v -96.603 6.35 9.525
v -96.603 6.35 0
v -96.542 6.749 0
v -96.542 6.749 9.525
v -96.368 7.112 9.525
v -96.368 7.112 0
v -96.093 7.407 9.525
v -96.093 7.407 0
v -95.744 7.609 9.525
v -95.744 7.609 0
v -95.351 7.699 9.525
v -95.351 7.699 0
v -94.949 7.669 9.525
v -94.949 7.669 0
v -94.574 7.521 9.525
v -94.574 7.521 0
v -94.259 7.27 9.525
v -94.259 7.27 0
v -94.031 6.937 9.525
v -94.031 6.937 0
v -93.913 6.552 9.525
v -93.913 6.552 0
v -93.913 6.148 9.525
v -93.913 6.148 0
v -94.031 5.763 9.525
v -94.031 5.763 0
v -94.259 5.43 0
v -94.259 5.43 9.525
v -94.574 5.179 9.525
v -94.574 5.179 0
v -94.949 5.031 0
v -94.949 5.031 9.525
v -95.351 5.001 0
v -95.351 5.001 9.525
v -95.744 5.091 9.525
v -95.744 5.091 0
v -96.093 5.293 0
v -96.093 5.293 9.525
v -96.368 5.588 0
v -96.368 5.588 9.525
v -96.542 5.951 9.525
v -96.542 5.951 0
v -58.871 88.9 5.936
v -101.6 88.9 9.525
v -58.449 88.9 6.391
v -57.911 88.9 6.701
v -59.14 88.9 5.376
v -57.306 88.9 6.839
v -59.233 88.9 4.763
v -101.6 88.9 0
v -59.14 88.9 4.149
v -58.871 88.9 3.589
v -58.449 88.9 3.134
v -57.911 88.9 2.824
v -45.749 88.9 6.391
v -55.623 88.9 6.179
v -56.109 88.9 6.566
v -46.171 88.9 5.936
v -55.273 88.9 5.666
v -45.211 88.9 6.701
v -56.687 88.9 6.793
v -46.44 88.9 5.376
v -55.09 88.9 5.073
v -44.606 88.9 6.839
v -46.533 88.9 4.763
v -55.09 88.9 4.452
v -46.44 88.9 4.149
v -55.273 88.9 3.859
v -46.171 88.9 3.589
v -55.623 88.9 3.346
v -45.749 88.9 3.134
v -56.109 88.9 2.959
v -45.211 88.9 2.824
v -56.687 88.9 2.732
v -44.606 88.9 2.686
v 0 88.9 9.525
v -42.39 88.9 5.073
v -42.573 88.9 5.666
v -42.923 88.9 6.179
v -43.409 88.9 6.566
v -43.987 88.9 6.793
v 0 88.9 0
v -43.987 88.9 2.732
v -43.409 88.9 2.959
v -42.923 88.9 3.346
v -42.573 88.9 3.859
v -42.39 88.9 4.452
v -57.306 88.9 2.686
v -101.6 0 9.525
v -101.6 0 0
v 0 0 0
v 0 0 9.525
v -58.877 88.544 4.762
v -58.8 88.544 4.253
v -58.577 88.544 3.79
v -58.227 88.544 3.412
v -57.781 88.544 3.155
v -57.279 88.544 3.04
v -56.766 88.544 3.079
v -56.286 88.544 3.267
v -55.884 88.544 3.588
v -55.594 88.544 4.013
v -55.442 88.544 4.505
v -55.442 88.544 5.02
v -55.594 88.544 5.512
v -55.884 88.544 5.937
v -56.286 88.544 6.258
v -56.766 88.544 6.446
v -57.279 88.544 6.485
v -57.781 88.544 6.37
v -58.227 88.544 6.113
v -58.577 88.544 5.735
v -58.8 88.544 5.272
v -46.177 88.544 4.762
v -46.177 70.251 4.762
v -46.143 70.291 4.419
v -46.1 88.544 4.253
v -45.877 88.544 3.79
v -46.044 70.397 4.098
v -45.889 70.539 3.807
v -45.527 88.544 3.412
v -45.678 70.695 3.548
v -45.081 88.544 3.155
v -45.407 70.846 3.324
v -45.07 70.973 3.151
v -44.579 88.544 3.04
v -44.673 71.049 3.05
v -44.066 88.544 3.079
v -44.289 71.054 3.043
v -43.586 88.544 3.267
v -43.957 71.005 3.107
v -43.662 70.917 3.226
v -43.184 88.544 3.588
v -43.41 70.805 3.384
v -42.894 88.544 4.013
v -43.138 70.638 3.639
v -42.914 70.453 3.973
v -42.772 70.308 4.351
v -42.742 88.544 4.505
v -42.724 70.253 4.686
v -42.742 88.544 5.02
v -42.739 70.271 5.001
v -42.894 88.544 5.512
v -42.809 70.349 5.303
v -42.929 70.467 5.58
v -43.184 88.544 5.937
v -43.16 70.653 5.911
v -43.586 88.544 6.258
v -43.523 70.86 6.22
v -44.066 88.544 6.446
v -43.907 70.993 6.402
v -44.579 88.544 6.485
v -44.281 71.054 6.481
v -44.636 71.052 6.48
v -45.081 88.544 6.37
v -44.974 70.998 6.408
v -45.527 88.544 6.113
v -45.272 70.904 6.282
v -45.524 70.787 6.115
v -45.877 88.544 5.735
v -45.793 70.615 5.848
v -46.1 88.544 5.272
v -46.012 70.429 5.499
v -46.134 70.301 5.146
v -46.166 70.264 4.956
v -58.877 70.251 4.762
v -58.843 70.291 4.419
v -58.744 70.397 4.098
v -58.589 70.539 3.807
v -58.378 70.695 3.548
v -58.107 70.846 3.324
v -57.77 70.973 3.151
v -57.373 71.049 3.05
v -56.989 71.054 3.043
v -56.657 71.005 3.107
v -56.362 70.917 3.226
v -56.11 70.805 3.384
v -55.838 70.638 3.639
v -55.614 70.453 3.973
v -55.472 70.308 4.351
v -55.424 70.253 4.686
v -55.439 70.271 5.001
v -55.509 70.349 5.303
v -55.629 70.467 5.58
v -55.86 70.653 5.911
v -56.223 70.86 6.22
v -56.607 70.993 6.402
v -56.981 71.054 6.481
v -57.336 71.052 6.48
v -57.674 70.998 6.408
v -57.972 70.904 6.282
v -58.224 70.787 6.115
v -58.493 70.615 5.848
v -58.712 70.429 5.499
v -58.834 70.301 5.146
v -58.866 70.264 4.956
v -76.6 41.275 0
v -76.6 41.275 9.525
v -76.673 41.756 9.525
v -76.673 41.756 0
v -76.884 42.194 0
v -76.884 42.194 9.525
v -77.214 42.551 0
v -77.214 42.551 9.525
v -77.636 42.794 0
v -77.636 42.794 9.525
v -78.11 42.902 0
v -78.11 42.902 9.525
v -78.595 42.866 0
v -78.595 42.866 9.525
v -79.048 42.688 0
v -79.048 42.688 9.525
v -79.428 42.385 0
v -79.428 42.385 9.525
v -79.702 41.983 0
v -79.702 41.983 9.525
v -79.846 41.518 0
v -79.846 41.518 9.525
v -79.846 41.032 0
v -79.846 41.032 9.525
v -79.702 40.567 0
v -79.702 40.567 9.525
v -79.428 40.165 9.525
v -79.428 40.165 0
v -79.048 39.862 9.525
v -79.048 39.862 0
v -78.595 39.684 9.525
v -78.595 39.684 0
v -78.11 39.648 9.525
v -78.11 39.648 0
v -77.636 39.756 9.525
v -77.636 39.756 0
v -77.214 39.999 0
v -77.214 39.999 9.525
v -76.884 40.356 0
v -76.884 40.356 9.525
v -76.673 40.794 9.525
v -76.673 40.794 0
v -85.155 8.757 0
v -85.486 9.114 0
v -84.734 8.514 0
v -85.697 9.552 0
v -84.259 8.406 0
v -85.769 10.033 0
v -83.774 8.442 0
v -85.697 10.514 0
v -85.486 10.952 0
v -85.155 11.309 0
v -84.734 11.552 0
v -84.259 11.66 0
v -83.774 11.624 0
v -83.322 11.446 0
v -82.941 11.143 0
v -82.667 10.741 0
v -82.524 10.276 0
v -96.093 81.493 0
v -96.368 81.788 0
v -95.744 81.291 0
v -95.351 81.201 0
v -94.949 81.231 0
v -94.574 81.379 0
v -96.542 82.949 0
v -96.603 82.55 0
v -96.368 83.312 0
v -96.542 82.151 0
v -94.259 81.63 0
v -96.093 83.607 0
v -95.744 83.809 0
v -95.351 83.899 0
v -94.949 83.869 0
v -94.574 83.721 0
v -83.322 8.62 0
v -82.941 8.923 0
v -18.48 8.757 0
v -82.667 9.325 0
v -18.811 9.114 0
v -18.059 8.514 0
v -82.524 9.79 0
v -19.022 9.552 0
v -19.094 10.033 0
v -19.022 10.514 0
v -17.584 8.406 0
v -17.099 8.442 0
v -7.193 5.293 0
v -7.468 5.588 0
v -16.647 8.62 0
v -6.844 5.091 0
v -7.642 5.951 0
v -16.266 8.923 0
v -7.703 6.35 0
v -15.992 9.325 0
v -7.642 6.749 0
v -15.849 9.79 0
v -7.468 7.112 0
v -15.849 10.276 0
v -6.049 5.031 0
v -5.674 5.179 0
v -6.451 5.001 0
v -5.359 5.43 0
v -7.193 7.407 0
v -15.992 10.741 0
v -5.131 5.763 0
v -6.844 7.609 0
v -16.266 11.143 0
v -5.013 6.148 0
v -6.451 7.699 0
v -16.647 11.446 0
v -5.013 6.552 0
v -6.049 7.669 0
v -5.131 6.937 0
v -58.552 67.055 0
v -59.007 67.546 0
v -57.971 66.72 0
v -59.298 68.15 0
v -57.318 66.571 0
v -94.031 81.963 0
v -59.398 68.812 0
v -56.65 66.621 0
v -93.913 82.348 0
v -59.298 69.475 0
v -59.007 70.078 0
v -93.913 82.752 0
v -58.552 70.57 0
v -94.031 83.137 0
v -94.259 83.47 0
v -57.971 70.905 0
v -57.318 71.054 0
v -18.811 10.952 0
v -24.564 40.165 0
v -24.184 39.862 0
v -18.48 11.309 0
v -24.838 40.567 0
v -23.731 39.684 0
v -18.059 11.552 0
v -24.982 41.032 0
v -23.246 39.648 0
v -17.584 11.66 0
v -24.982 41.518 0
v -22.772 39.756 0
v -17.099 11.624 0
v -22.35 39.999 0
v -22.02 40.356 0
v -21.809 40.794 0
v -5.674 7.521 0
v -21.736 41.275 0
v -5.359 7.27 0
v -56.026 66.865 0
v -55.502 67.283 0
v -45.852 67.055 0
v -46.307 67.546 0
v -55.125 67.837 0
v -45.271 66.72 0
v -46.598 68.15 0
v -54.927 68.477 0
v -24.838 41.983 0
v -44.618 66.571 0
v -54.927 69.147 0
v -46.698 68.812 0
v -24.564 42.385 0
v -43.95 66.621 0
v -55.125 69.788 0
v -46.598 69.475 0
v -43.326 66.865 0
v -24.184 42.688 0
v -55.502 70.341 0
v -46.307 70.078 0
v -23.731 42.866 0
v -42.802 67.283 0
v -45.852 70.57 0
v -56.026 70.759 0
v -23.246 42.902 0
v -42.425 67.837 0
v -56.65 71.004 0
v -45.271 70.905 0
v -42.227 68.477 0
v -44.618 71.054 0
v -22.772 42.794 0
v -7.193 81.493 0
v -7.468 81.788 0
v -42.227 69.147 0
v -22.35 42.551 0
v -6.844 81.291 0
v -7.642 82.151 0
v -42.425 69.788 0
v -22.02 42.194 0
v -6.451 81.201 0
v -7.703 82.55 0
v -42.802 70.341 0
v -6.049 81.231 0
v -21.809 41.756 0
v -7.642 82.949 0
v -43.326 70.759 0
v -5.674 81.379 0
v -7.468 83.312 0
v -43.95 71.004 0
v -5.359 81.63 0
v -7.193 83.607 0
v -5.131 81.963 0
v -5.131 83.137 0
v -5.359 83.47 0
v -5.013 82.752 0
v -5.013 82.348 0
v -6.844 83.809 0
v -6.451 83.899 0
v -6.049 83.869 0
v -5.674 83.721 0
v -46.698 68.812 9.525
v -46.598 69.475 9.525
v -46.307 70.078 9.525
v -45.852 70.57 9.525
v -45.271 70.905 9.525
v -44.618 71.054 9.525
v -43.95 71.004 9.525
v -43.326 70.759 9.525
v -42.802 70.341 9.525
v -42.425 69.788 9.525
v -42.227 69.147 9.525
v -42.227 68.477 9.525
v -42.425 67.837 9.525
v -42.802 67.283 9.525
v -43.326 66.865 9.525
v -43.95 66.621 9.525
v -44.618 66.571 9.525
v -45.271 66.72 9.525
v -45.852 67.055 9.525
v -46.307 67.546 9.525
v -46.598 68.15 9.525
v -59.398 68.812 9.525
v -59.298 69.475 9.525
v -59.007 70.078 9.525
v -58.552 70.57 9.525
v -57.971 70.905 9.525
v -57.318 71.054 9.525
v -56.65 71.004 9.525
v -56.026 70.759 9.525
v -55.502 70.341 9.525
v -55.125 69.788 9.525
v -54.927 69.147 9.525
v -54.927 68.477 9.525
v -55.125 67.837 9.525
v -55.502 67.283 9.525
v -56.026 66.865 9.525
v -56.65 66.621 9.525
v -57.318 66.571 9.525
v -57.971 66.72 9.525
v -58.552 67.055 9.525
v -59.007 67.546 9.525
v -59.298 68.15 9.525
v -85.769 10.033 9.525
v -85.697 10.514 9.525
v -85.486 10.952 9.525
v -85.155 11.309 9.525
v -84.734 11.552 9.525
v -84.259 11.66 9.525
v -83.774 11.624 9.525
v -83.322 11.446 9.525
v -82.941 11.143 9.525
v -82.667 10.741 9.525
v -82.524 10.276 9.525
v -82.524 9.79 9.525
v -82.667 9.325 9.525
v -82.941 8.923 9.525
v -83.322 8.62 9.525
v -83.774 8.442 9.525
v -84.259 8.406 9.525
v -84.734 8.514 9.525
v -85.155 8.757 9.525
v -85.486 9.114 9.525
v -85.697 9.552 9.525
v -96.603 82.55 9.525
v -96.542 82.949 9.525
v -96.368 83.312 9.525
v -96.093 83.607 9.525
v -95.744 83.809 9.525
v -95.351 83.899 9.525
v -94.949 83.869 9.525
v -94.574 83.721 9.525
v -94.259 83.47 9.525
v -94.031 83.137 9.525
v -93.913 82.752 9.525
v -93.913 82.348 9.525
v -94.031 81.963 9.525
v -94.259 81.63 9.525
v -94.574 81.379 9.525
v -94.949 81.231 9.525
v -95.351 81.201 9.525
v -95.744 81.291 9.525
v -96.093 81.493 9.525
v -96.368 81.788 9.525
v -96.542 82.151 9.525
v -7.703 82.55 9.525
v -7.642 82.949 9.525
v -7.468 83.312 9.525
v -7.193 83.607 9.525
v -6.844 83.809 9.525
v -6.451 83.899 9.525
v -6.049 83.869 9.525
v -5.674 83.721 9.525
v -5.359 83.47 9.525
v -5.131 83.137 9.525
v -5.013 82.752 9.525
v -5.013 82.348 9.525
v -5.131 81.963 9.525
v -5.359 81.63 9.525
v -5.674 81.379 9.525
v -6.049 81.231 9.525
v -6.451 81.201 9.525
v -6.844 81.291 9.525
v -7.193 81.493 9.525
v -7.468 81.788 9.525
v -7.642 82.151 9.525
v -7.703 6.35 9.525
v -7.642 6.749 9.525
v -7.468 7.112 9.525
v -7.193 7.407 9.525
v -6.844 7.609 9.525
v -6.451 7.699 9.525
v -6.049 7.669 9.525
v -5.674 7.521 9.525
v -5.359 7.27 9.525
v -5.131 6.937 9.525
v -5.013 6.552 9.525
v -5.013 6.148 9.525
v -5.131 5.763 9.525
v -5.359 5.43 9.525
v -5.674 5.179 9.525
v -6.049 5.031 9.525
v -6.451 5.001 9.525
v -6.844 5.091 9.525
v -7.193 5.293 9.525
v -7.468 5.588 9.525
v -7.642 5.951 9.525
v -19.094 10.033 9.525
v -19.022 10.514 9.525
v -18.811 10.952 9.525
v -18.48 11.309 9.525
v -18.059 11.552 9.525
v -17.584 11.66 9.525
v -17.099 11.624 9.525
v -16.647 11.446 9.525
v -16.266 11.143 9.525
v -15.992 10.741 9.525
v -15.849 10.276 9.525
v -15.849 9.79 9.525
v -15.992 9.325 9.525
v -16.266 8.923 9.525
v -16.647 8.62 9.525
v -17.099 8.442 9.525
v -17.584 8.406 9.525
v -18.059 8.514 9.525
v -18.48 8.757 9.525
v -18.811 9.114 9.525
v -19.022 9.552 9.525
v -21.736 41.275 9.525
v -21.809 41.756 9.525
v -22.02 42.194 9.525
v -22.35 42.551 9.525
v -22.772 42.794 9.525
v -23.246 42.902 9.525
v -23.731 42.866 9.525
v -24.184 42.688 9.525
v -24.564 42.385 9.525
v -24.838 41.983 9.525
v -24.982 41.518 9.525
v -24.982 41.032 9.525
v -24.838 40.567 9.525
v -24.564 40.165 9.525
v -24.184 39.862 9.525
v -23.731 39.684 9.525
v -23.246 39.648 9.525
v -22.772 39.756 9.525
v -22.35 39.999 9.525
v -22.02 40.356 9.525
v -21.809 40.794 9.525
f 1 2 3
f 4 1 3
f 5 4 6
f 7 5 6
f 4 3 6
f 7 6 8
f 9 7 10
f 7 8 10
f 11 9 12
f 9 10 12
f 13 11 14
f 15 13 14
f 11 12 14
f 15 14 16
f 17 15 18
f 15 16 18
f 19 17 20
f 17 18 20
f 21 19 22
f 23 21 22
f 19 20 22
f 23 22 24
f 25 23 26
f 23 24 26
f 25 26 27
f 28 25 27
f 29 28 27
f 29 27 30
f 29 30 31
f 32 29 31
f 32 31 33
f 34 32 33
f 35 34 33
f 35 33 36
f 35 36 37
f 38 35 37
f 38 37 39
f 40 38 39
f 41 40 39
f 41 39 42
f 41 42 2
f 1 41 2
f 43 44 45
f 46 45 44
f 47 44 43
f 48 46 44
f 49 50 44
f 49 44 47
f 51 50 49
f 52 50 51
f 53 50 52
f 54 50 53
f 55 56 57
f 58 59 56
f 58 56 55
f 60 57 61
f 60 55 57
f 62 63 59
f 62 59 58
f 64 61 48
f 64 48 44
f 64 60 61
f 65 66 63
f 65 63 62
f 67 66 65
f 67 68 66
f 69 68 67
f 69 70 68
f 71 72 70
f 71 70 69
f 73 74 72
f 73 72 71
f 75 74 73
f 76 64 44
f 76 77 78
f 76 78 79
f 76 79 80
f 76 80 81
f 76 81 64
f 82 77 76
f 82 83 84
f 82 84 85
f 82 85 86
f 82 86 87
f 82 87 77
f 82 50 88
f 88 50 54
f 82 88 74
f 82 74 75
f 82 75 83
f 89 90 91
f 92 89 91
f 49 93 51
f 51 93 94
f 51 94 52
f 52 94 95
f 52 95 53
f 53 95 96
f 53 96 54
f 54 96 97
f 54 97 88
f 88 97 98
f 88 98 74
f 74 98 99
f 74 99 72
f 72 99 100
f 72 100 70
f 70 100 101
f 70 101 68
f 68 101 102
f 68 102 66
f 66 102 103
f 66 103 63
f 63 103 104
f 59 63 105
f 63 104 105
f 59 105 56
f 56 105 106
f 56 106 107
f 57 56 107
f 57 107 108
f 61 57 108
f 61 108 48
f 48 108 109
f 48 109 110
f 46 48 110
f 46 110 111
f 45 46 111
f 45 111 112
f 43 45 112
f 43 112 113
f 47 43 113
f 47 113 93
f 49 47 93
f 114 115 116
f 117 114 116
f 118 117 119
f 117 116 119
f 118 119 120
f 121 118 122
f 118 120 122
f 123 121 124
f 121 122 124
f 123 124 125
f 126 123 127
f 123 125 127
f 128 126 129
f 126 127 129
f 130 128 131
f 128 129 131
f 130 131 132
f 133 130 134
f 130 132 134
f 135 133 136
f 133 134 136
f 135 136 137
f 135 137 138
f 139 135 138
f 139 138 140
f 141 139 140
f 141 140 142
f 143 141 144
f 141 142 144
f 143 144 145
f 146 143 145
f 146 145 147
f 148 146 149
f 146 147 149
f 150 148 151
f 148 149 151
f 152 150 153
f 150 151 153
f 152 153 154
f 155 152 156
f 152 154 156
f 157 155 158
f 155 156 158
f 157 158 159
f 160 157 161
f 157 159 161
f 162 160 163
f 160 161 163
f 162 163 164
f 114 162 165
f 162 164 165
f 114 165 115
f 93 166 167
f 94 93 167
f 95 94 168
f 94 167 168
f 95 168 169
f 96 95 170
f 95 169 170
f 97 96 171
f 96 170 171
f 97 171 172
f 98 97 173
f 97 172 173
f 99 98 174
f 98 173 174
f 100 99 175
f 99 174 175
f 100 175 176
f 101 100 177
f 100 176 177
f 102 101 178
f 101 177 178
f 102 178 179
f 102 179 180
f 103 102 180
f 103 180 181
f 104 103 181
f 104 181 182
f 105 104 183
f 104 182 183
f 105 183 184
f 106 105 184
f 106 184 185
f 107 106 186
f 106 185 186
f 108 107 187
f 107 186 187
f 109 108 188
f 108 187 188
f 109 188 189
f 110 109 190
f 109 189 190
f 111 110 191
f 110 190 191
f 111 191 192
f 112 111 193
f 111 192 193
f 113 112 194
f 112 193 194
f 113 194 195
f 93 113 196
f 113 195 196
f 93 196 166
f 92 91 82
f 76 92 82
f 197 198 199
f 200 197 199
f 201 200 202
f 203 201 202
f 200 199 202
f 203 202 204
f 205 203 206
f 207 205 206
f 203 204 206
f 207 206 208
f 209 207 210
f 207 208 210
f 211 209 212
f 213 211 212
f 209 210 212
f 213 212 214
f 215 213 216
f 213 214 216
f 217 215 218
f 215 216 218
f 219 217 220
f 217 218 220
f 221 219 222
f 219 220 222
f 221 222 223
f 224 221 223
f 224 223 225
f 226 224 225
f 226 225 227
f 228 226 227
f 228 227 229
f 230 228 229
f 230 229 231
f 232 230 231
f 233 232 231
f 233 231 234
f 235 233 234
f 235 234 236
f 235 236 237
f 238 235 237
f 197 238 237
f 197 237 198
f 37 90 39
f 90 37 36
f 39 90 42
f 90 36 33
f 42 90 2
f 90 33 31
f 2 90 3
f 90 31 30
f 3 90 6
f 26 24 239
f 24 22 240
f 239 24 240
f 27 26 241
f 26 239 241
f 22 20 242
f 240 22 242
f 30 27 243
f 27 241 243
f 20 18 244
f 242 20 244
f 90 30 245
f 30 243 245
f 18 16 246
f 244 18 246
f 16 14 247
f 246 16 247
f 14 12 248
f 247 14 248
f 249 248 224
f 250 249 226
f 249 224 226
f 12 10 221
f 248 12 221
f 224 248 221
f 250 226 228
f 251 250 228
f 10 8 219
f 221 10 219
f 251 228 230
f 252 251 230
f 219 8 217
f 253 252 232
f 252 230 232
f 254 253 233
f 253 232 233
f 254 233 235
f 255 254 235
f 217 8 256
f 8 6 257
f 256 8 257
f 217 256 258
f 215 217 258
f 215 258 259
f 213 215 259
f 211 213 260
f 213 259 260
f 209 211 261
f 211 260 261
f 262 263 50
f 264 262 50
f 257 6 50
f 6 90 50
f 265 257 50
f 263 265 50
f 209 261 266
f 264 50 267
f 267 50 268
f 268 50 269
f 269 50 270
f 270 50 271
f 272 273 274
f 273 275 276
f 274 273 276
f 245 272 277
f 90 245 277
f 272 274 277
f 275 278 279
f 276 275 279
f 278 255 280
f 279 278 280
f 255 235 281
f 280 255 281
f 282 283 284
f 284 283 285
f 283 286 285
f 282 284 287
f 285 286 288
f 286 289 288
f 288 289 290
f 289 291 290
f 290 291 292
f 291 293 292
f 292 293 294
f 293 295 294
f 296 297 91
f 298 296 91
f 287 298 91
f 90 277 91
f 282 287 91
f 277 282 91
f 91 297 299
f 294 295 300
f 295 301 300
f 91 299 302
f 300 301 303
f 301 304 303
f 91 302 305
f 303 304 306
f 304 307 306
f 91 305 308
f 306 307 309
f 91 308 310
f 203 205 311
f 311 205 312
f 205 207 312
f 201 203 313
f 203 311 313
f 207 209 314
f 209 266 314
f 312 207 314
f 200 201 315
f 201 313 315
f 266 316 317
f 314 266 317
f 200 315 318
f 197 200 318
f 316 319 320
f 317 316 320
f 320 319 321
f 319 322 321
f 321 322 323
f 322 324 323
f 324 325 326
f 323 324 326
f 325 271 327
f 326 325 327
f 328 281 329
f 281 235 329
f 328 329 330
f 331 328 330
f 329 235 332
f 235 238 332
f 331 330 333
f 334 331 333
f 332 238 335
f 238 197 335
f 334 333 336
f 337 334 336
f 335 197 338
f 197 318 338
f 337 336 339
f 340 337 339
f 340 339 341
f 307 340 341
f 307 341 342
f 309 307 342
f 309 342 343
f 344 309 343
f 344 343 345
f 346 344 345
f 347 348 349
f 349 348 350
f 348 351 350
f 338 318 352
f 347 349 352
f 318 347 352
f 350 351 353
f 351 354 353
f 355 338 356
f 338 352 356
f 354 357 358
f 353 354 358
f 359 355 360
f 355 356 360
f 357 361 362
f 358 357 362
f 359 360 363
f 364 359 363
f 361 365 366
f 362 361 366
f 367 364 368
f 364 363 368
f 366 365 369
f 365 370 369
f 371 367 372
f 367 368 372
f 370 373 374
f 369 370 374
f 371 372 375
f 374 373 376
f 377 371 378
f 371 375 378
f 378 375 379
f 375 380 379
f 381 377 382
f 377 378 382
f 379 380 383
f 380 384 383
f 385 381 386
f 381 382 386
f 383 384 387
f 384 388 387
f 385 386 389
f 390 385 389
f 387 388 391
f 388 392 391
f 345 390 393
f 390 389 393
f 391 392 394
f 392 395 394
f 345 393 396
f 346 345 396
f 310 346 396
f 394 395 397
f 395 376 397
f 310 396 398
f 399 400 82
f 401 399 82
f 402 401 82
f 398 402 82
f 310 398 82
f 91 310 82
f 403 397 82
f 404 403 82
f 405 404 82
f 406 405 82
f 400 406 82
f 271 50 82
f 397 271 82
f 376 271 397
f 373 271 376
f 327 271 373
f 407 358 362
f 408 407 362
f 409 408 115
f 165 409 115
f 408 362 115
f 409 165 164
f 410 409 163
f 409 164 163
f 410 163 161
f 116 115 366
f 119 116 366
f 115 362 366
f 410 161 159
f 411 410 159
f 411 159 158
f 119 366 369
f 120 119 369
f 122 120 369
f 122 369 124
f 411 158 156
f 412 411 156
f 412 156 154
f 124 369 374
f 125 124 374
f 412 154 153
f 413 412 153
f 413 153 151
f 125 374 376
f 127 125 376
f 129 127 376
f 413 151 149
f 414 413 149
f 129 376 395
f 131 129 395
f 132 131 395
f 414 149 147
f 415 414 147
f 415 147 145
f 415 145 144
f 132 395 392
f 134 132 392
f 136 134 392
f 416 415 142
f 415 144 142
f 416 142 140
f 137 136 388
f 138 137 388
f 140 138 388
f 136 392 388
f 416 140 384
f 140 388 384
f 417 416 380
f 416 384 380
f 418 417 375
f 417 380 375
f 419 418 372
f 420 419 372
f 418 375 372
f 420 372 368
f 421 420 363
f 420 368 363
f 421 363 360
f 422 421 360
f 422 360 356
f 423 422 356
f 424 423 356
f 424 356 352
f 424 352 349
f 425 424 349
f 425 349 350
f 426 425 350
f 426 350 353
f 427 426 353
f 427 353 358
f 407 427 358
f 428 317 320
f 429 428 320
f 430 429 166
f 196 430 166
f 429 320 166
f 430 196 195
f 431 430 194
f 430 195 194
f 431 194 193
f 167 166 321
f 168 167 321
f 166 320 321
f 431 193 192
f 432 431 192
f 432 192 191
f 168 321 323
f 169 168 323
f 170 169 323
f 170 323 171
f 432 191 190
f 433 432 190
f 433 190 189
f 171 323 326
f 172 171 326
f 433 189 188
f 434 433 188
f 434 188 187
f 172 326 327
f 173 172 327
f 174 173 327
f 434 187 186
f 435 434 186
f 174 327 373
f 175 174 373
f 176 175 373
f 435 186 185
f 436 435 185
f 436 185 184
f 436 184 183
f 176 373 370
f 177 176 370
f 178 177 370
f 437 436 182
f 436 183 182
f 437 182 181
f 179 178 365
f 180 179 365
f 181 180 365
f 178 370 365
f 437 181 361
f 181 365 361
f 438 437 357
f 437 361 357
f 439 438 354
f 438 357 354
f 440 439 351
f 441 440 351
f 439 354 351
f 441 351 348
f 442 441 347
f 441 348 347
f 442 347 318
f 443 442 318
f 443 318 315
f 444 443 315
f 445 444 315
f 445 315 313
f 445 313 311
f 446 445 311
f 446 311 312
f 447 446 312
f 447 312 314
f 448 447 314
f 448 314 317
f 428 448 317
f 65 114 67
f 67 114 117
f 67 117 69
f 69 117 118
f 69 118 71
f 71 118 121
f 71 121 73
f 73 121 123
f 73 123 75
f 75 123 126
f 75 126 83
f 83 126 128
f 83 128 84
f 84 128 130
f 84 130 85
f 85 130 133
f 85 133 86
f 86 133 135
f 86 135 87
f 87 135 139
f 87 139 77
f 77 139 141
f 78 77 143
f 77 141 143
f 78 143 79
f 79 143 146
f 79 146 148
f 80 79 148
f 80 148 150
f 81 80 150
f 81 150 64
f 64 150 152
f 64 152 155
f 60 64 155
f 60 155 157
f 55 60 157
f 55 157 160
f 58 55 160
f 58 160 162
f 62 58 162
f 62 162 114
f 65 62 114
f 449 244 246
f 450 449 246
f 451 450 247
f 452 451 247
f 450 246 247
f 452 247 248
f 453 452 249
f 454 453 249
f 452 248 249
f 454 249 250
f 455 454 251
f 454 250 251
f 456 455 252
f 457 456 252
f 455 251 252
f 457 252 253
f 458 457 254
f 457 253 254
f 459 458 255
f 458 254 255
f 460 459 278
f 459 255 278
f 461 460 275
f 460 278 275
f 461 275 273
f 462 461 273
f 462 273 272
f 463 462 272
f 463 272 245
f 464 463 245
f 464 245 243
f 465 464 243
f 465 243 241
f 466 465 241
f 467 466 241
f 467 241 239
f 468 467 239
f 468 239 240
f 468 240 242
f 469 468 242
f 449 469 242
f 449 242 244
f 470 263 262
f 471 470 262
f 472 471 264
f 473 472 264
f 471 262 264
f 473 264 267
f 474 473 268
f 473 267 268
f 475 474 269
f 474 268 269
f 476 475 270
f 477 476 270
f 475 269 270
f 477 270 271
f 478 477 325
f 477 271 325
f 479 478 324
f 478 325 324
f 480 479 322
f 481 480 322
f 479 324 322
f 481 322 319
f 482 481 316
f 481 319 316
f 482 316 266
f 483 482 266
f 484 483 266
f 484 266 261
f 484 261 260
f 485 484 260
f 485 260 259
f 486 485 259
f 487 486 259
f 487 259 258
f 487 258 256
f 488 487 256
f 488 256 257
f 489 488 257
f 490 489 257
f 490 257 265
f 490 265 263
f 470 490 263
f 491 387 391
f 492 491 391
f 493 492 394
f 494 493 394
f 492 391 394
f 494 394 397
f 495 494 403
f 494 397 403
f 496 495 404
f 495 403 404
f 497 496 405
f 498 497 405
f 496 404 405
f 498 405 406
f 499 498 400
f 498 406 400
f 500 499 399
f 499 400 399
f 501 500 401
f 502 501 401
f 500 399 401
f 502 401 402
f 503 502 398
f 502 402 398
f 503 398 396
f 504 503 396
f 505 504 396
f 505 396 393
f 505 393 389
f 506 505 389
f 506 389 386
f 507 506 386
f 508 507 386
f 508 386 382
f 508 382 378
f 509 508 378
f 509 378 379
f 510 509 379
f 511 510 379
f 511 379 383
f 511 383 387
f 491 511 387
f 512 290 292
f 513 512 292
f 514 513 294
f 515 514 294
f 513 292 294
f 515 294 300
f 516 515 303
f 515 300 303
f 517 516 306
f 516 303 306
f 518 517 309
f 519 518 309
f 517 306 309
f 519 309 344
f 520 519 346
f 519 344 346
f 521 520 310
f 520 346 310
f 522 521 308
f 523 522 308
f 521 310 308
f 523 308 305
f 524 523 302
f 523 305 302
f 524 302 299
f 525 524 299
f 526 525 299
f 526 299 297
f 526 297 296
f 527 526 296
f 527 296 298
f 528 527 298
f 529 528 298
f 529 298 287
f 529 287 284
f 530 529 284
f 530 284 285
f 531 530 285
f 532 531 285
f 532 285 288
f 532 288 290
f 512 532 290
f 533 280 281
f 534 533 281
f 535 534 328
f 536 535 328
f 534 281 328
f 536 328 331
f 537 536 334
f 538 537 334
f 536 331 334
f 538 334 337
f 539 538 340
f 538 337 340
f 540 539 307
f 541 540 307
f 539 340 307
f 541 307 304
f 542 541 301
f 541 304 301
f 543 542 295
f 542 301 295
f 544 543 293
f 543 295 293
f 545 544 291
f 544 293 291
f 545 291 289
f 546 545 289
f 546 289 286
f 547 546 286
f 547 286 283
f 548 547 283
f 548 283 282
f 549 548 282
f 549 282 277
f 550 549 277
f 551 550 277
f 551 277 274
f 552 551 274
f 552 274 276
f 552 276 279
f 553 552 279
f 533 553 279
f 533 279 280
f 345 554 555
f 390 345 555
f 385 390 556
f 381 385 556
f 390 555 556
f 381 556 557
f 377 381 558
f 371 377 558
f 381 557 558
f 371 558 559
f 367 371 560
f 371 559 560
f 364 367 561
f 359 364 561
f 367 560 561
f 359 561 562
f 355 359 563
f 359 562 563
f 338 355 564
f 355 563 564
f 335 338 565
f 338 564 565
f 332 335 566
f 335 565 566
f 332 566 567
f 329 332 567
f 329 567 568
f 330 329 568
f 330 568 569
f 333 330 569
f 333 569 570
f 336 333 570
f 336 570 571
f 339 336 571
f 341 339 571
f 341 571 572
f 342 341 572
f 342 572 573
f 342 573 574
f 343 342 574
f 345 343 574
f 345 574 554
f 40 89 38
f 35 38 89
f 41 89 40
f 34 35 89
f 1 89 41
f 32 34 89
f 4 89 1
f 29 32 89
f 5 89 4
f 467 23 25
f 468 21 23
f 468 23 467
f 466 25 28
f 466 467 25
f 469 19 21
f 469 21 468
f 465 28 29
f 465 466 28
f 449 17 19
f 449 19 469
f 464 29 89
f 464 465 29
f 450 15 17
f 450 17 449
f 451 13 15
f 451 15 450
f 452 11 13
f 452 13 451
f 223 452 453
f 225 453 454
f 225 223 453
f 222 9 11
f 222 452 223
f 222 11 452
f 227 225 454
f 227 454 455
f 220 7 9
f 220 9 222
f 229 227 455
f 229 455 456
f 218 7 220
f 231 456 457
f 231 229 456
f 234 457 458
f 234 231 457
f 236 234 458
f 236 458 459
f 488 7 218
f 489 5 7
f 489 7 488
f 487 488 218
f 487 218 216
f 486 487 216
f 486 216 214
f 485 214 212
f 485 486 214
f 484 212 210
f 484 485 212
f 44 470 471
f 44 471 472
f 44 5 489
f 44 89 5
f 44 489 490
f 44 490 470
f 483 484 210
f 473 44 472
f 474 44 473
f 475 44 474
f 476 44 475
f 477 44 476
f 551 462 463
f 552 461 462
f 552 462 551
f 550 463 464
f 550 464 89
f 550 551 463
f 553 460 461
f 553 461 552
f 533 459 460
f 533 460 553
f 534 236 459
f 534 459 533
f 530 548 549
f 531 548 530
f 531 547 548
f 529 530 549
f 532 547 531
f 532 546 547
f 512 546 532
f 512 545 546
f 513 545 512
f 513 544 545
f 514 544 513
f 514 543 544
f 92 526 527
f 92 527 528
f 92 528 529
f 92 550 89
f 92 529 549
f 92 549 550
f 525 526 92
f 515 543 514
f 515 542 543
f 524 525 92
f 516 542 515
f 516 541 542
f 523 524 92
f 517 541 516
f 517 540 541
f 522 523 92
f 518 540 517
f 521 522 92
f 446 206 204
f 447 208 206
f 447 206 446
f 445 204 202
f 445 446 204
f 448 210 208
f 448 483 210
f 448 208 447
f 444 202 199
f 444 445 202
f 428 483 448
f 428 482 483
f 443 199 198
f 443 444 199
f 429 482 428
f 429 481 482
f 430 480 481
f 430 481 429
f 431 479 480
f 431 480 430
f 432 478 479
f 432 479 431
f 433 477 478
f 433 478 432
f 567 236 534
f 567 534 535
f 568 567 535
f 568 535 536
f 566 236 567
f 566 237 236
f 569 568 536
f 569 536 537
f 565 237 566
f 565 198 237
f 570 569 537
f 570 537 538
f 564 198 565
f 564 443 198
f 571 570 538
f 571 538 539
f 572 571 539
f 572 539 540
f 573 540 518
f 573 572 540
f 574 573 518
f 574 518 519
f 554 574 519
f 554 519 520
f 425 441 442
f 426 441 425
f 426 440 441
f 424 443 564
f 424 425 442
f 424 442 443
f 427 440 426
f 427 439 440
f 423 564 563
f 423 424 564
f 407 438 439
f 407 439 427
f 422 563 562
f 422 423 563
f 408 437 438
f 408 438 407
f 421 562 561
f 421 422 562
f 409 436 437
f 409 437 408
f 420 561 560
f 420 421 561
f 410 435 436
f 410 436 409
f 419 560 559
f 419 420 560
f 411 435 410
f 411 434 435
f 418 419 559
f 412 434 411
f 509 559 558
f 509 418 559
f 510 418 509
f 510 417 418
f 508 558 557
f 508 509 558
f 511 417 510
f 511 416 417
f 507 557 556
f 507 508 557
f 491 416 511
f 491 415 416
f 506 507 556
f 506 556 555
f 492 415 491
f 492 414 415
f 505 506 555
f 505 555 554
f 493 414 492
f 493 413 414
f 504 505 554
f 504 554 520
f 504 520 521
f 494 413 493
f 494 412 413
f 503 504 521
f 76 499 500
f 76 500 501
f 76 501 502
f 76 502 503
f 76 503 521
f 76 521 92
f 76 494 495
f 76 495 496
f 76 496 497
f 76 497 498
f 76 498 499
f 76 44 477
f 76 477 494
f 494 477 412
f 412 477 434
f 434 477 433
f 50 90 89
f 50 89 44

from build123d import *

# Parameters (mm, degrees)
SKETCH1_W                       = 101.6
SKETCH1_H                       = 88.9
BOSS_EXTRUDE1_DEPTH             = 9.525
F_8_32_TAPPED_HOLE1_D           = 3.4544
F_8_32_TAPPED_HOLE1_DEPTH       = 19.05
F_8_32_TAPPED_HOLE1_CSINK_D     = 4.1656
F_8_32_TAPPED_HOLE1_CSINK_ANGLE = 90
F_8_32_TAPPED_HOLE1_TIP         = 1.037806461
F_8_CLEARANCE_HOLE2_D           = 4.4958
F_8_CLEARANCE_HOLE2_DEPTH       = 25.4
F_8_CLEARANCE_HOLE2_TIP         = 1.350674586
F_6_32_TAPPED_HOLE1_D           = 2.7051
F_4_CLEARANCE_HOLE1_D           = 3.2639
F_4_CLEARANCE_HOLE1_DEPTH       = 9.525
F_4_CLEARANCE_HOLE2_D           = 3.2639
F_4_CLEARANCE_HOLE2_DEPTH       = 9.525


with BuildPart() as part:
    # Sketch1 → Boss-Extrude1 (new body)
    with BuildSketch(Plane.XY):
        with Locations((-50.8, 44.45)):
            Rectangle(SKETCH1_W, SKETCH1_H)
    extrude(amount=BOSS_EXTRUDE1_DEPTH)

    # #8-32 Tapped Hole1
    with Locations(Plane(origin=(0, 88.9, 0), x_dir=(1, 0, 0), z_dir=(0, 1, 0))):
        with Locations((-44.45, -4.7625), (-57.15, -4.7625)):
            CounterSinkHole(F_8_32_TAPPED_HOLE1_D / 2, F_8_32_TAPPED_HOLE1_CSINK_D / 2, depth=F_8_32_TAPPED_HOLE1_DEPTH, counter_sink_angle=F_8_32_TAPPED_HOLE1_CSINK_ANGLE)
            with Locations((0, 0, -(F_8_32_TAPPED_HOLE1_DEPTH + F_8_32_TAPPED_HOLE1_TIP / 2))):  # 118° drill point
                Cone(0, F_8_32_TAPPED_HOLE1_D / 2, F_8_32_TAPPED_HOLE1_TIP, mode=Mode.SUBTRACT)

    # #8 Clearance Hole2
    with Locations(Plane.XY.offset(9.525)):
        with Locations((-44.45, 68.812193539), (-57.15, 68.812193539)):
            Hole(F_8_CLEARANCE_HOLE2_D / 2, depth=F_8_CLEARANCE_HOLE2_DEPTH)
            with Locations((0, 0, -(F_8_CLEARANCE_HOLE2_DEPTH + F_8_CLEARANCE_HOLE2_TIP / 2))):  # 118° drill point
                Cone(0, F_8_CLEARANCE_HOLE2_D / 2, F_8_CLEARANCE_HOLE2_TIP, mode=Mode.SUBTRACT)

    # #6-32 Tapped Hole1 (through all)
    with Locations(Plane.XY.offset(9.525)):
        with Locations((-95.25, 6.35), (-95.25, 82.55), (-6.35, 6.35), (-6.35, 82.55)):
            Hole(F_6_32_TAPPED_HOLE1_D / 2)

    # #4 Clearance Hole1
    with Locations(Plane.XY.offset(9.525)):
        with Locations((-17.4625, 10.033), (-84.1375, 10.033)):
            Hole(F_4_CLEARANCE_HOLE1_D / 2, depth=F_4_CLEARANCE_HOLE1_DEPTH)

    # #4 Clearance Hole2
    with Locations(Plane(origin=(0, 0, 0), x_dir=(-1, 0, 0), z_dir=(0, 0, -1))):
        with Locations((23.368, 41.275), (78.232, 41.275)):
            Hole(F_4_CLEARANCE_HOLE2_D / 2, depth=F_4_CLEARANCE_HOLE2_DEPTH)


solid = part.part
